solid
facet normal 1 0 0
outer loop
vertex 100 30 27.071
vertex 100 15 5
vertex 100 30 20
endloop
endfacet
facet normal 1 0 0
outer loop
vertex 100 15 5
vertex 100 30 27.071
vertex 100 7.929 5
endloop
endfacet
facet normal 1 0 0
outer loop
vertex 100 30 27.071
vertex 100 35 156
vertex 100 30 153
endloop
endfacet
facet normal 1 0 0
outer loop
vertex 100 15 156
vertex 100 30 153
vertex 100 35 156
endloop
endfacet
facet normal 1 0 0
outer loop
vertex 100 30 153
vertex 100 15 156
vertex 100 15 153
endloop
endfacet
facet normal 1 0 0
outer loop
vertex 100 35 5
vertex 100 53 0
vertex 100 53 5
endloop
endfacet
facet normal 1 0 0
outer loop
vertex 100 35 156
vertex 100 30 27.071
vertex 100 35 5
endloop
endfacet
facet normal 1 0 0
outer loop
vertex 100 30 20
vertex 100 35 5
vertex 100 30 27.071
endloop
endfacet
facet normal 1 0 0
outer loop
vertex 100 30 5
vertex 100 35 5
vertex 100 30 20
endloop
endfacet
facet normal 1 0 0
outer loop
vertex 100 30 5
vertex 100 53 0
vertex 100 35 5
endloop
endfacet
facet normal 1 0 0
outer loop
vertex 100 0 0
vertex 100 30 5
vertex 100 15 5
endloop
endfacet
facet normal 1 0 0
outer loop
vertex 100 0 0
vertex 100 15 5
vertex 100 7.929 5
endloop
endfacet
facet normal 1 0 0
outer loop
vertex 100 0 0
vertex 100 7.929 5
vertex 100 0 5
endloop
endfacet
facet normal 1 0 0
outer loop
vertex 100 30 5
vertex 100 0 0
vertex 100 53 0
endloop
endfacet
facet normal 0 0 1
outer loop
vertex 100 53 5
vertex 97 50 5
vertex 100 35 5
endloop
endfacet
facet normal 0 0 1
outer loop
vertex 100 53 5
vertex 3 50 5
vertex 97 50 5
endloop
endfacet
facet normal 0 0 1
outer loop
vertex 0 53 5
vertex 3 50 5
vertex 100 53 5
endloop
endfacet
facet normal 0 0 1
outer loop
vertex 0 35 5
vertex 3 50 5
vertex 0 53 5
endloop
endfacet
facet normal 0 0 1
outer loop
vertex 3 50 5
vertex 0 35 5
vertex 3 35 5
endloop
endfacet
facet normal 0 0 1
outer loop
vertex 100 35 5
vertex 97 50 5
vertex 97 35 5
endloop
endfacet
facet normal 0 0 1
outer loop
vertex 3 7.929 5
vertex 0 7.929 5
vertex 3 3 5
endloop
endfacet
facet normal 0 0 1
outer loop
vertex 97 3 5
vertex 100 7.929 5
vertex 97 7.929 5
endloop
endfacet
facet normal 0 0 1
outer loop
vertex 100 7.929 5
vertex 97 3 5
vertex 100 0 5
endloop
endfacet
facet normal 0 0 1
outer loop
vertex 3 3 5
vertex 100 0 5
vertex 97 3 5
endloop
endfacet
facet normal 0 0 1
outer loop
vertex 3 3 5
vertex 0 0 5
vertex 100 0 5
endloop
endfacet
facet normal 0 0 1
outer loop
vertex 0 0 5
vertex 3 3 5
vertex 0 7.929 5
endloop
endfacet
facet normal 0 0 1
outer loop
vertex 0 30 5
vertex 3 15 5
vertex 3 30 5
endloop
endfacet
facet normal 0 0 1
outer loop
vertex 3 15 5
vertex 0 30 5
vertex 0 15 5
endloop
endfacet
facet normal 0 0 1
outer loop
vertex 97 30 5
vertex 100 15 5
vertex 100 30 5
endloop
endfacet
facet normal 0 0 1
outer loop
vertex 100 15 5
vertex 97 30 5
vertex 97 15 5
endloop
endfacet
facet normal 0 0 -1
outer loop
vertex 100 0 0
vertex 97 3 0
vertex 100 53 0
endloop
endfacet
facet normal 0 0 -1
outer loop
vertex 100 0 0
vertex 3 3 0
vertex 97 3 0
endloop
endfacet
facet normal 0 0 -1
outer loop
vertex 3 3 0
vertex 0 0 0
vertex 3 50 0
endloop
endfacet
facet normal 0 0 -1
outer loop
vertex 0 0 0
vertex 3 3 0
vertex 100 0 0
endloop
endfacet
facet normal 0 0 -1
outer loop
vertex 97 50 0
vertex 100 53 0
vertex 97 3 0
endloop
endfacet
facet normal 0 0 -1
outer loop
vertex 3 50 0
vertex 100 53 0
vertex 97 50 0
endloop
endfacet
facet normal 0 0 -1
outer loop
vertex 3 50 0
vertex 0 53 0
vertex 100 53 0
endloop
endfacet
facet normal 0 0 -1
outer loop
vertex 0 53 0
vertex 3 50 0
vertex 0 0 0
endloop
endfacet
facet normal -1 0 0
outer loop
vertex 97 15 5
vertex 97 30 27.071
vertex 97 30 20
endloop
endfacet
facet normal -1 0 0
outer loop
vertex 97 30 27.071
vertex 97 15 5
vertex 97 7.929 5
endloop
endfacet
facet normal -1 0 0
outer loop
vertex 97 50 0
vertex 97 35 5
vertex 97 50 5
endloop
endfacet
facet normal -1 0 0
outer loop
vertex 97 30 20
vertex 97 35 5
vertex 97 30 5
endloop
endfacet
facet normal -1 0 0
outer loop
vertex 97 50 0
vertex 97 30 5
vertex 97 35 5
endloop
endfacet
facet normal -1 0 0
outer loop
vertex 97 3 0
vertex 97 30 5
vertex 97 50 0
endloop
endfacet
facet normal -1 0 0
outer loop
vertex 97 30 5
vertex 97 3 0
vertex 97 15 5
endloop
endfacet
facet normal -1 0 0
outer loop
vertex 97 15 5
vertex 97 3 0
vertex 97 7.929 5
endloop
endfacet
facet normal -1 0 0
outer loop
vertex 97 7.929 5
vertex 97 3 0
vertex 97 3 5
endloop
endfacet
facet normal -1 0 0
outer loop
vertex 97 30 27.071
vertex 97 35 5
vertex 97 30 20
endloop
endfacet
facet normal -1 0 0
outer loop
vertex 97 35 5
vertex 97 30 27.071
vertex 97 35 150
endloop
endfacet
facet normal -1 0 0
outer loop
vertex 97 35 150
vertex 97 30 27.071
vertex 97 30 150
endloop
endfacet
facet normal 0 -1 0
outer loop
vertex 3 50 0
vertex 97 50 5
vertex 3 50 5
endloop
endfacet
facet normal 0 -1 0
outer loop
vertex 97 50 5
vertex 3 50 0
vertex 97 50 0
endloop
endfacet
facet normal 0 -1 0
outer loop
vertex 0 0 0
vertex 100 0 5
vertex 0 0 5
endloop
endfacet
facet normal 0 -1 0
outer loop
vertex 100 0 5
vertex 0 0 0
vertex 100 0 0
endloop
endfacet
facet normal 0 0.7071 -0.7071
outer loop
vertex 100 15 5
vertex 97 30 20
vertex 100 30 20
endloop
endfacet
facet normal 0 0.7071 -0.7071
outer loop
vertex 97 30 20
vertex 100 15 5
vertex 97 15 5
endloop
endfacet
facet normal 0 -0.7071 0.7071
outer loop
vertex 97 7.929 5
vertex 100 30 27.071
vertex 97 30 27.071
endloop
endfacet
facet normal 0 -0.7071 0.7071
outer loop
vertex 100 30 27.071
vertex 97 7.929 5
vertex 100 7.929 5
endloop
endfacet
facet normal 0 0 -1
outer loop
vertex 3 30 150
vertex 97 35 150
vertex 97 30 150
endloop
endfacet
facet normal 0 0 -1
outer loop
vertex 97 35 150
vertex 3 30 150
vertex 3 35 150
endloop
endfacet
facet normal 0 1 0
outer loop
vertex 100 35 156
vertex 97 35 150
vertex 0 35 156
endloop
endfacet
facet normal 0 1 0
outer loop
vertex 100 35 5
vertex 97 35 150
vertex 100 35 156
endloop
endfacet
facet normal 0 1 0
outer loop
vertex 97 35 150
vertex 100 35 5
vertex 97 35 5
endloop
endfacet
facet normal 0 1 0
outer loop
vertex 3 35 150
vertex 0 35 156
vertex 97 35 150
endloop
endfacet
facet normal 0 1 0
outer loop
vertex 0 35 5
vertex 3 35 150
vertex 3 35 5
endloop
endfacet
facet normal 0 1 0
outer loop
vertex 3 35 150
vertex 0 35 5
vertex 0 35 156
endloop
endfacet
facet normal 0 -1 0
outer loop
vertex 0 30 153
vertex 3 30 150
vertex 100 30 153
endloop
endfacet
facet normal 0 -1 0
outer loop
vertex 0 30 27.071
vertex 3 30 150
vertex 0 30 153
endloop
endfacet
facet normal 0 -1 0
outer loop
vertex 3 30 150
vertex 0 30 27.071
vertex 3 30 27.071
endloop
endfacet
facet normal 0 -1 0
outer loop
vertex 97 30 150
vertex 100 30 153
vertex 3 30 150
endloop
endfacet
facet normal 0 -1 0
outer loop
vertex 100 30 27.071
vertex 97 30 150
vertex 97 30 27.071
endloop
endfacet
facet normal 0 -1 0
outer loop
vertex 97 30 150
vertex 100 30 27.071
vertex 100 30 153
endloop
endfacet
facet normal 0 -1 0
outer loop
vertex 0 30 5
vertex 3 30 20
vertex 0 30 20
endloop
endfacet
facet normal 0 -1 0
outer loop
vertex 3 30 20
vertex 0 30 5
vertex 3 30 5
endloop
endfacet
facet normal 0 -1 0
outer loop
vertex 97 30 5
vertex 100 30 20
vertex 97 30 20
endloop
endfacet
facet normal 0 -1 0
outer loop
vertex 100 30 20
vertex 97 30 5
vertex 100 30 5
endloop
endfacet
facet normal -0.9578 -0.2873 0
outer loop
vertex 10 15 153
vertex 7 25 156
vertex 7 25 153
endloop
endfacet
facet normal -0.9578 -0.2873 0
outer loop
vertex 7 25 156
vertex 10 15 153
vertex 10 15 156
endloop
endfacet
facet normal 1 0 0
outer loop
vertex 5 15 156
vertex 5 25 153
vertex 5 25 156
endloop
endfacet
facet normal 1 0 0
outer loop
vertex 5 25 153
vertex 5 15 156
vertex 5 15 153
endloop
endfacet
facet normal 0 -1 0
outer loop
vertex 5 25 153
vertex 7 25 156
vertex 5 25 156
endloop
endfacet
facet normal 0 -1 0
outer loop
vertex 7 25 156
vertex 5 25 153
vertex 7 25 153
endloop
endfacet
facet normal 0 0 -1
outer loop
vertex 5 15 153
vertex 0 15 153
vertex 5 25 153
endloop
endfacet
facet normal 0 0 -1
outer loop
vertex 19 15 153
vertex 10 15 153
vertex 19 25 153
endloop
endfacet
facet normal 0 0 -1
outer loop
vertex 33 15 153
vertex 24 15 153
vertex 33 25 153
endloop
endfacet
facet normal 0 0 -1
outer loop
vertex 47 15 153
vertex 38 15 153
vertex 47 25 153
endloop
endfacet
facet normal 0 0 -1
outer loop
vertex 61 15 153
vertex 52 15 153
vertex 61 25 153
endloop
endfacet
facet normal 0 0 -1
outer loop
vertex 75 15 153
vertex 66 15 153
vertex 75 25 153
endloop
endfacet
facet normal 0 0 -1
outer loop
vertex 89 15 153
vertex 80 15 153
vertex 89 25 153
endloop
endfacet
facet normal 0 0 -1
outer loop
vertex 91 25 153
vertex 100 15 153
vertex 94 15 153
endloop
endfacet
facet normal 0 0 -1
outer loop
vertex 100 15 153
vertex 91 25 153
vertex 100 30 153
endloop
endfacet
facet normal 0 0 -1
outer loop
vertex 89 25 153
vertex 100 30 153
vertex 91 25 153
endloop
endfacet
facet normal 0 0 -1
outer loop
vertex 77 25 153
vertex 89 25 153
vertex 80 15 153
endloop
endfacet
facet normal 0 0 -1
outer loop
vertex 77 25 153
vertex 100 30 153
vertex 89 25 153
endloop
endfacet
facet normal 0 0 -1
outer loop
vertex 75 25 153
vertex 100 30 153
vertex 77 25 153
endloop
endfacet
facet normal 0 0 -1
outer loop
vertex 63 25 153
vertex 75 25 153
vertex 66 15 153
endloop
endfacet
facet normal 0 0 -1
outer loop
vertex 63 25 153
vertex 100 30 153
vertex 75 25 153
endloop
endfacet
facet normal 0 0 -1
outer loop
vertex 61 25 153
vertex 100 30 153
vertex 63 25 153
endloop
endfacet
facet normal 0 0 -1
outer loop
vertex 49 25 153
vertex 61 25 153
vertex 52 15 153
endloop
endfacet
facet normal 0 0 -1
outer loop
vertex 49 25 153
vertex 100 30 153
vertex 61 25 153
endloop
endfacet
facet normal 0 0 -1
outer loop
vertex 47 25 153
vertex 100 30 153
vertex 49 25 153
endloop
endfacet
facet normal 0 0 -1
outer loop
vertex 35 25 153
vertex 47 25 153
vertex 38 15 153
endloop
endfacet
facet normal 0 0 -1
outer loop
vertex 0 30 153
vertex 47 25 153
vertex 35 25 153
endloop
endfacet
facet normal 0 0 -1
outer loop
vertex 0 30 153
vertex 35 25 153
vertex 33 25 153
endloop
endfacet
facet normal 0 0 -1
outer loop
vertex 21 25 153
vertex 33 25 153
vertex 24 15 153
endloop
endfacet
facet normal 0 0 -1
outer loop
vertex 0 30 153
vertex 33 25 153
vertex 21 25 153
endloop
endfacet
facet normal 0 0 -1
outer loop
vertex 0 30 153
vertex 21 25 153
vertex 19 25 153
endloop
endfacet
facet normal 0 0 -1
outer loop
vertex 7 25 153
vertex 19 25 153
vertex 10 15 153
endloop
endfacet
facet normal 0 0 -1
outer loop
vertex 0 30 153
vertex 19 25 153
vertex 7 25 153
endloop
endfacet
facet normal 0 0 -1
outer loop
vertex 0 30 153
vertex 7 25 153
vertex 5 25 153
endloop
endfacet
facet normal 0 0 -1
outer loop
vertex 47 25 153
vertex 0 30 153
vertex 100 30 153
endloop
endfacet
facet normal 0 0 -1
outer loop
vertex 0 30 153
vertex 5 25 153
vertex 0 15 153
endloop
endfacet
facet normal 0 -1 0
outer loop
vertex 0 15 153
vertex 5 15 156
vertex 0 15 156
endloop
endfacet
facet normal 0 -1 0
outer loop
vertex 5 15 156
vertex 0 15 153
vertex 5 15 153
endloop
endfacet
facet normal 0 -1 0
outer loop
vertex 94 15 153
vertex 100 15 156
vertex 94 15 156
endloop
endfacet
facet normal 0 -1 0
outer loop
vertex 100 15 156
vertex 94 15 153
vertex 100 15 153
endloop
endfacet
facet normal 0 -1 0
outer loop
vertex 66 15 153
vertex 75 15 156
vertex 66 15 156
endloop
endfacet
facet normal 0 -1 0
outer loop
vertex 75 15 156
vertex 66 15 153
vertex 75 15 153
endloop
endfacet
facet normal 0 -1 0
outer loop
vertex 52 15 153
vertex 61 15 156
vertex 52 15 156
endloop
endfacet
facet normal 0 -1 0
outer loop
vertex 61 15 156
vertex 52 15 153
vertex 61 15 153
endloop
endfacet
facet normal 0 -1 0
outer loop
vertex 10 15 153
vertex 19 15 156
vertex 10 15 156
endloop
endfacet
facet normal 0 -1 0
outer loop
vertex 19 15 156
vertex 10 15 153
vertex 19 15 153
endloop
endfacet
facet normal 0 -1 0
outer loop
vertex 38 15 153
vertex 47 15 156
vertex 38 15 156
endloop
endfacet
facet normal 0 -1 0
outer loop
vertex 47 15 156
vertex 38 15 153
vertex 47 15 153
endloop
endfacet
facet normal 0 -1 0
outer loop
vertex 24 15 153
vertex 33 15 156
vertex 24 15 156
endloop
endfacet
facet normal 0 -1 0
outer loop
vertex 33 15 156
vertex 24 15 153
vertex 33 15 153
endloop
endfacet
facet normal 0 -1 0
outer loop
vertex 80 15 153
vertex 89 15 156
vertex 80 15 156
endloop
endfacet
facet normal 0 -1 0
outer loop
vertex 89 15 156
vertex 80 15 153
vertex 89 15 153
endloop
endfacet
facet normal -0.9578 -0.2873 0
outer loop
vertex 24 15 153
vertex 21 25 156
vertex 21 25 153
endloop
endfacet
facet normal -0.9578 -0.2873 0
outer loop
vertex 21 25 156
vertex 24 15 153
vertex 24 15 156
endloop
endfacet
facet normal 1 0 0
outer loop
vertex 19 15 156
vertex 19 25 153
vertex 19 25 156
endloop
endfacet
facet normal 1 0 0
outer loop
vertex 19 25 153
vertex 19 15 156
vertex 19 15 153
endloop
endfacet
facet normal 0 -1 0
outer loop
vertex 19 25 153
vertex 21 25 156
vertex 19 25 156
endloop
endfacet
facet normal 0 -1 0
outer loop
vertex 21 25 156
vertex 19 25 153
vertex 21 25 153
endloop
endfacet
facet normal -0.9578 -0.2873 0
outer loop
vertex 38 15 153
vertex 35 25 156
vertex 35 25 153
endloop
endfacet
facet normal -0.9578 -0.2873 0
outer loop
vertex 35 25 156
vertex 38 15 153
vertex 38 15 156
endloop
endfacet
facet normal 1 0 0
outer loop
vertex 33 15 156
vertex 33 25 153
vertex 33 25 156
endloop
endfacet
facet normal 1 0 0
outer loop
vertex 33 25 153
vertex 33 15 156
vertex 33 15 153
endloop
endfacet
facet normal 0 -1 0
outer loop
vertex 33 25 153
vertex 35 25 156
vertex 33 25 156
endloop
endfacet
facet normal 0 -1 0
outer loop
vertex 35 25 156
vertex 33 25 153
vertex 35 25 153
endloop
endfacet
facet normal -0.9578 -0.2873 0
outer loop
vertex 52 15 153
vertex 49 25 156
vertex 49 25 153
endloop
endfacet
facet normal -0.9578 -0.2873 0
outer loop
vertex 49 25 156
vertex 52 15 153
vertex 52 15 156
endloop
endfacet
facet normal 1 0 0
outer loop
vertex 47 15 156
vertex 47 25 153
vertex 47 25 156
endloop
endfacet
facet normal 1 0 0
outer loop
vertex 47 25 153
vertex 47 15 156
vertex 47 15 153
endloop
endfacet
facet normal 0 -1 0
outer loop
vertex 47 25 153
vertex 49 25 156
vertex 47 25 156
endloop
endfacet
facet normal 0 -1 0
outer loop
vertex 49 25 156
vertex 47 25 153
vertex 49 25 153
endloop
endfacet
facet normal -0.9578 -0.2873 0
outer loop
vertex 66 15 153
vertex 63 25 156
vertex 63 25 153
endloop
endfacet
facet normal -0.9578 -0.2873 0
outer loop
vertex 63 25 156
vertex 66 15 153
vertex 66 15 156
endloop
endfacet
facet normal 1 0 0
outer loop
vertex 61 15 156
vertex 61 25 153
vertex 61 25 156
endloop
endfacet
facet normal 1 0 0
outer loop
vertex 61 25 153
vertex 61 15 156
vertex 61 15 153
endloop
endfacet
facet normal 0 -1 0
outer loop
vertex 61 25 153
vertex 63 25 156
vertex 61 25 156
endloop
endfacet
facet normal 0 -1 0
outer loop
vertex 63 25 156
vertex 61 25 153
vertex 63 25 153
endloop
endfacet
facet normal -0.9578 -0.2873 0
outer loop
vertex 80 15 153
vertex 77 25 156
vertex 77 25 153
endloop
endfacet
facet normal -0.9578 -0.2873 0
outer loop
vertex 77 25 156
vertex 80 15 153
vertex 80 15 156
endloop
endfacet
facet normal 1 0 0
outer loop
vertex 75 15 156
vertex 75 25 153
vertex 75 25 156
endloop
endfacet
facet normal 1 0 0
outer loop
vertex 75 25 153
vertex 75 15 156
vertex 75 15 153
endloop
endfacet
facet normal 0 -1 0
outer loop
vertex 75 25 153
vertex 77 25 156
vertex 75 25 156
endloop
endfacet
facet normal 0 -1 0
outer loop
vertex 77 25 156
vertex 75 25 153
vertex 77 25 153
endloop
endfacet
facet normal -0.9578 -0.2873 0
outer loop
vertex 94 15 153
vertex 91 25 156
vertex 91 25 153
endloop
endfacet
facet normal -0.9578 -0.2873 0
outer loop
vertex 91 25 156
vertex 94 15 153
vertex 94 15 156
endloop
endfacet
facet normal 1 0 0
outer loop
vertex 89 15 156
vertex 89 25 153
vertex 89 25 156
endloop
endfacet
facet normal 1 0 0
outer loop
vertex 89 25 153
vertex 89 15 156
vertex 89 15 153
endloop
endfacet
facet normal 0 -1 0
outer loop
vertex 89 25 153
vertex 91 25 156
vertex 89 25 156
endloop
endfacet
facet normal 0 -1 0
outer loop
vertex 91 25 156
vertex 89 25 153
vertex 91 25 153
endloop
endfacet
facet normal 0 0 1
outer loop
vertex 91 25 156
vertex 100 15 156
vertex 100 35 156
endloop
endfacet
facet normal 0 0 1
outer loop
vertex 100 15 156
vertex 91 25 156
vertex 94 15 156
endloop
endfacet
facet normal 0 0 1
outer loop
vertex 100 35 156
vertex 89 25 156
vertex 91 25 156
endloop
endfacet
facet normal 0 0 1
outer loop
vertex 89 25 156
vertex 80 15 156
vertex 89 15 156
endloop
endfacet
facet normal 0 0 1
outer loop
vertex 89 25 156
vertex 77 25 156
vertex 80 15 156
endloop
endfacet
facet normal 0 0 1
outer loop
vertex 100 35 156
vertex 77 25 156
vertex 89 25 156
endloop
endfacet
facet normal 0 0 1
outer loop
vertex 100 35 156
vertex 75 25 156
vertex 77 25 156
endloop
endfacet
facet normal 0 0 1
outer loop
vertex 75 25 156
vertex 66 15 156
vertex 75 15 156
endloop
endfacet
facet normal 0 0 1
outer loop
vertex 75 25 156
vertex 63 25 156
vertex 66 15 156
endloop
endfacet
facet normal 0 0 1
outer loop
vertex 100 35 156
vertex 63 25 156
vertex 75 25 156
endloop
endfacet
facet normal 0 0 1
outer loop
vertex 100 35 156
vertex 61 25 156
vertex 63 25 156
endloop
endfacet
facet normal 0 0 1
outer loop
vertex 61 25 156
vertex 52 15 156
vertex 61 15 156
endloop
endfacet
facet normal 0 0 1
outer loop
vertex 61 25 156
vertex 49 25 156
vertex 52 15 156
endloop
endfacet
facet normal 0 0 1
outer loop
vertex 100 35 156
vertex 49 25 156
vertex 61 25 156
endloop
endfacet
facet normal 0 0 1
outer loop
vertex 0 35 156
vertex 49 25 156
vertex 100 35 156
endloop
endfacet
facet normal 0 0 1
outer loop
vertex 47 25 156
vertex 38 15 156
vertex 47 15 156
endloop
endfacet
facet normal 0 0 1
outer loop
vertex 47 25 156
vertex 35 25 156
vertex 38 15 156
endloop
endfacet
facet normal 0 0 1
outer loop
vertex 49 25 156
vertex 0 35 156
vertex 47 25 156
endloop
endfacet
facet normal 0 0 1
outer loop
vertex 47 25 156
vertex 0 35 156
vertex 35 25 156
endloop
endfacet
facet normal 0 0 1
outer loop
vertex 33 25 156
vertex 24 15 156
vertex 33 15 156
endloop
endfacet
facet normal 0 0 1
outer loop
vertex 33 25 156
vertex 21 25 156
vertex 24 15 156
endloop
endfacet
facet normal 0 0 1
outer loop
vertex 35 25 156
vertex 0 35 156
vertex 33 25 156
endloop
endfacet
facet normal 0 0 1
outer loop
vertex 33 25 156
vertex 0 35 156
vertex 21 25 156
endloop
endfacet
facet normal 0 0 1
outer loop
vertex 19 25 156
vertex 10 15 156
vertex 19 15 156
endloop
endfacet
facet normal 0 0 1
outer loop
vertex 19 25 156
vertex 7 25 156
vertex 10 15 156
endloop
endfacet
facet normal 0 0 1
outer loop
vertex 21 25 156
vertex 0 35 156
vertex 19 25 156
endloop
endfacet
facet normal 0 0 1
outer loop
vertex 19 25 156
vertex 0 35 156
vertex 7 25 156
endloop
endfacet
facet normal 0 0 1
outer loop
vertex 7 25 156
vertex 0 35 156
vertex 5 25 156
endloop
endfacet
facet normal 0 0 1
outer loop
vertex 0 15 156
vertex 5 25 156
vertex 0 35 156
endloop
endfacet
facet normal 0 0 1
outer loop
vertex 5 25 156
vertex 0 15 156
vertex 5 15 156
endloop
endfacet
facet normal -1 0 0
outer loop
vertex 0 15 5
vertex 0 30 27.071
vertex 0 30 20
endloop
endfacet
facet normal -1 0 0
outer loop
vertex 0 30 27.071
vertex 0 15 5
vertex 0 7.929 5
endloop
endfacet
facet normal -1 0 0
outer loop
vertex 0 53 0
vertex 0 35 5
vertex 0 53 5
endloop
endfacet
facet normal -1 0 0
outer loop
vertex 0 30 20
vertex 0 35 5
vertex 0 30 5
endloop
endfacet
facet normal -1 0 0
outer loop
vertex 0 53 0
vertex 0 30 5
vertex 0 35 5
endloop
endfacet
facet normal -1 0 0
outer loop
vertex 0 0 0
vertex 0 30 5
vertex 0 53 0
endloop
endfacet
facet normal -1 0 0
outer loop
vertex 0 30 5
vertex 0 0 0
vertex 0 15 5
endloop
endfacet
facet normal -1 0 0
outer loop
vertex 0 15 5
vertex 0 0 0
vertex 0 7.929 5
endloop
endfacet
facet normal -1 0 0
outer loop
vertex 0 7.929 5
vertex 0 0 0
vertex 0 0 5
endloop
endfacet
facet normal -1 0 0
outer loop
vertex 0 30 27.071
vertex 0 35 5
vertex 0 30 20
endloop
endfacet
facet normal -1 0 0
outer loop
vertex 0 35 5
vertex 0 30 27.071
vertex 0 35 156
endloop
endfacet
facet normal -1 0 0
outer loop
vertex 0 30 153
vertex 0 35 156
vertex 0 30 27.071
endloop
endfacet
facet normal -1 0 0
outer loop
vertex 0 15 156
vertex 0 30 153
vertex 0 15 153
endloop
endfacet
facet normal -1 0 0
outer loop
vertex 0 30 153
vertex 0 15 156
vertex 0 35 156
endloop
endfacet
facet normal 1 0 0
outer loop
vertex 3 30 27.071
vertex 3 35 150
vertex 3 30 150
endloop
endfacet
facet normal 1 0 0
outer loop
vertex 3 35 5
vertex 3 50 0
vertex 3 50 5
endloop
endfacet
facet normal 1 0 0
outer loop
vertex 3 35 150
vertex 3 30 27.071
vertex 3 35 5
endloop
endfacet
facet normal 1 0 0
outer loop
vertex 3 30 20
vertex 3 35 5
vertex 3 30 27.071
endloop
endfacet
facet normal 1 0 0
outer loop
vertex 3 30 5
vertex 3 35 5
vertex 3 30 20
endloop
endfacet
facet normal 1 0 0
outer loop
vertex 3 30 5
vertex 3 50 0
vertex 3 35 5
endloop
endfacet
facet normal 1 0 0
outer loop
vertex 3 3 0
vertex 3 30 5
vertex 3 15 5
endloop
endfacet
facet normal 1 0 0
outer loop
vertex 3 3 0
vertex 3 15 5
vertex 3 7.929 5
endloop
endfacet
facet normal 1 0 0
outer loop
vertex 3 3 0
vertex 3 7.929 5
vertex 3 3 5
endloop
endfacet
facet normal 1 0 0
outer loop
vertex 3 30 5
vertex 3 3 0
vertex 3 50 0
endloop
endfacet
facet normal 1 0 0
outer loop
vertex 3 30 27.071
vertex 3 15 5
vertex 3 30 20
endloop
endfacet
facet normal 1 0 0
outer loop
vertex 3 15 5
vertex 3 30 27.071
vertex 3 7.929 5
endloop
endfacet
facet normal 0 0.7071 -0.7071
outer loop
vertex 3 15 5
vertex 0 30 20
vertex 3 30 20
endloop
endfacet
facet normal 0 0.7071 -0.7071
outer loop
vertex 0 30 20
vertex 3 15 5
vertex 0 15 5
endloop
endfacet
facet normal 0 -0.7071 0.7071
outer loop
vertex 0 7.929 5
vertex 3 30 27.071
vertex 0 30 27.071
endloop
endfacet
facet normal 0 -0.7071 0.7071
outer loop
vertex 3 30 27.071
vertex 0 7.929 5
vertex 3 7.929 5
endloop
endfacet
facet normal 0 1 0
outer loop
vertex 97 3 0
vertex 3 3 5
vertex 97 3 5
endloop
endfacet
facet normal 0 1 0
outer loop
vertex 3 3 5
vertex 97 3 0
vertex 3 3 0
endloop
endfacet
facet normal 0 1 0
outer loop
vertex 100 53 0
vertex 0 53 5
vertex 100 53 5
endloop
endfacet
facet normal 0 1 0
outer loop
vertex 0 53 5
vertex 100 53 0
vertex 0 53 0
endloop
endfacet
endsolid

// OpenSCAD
// Wooden Garden tool stand
// Designed by https://github.com/Surrogard

// Parameters
stand_height      = 150; // Height of the stand
stand_depth       = 50;  // Depth of the stand
stand_width       = 100; // Width of the stand
slot_width_wide   = 5;   //front width of the slot
slot_width_narrow = 2;   //back width of the slot
slot_depth        = 10;  // slot depth from the front of the board
board_depth       = 20;  //slot board depth
offset_depth      = 30;  // how far to the back should the stand be (for weight equalization)

// negativ of the tool slot shape for substraction later
module tool_slot() {
  linear_extrude(height = 10) polygon(points = [
    [0, 0],
    [slot_width_wide, 0],
    [slot_width_narrow, slot_depth],
    [0, slot_depth]
  ]);
}

// full stand including cut out triangle shapes for tool slots
module stand(){
  union() {
    //left side
    cube([3, stand_depth, 5]); //left foot
    translate([0, offset_depth - 20, 0]) rotate([45, 0, 0]) cube([3, 35, 5]); //left diagonal brace
    translate([0, offset_depth, 0]) {
      cube([3, 5, stand_height]); // left leg
    }
    // middle braces
    cube([stand_width, 3, 5]); // front foot brace
    translate([0, stand_depth, 0]) cube([stand_width, 3, 5]); //back foot brace
    // right side
    translate([stand_width - 3, 0, 0]) {
      cube([3, stand_depth, 5]); //right foot
      translate([0, offset_depth - 20, 0]) rotate([45, 0, 0]) cube([3, 35, 5]); //right diagonal brace
      translate([0, offset_depth, 0]) cube([3, 5, stand_height]); // right leg
    }
    // top side
    translate([0, offset_depth, stand_height]){
      cube([stand_width, 5, 3]); // top brace
      translate([0, -board_depth + 5, 3]) difference() { 
        cube([stand_width, board_depth, 3]); // tool slot board
        for(i=[0:6]){
          translate([i*14+5, 0, 0]) tool_slot(); // tool slot cutouts
        }
      }
    }
  }
}

stand();
